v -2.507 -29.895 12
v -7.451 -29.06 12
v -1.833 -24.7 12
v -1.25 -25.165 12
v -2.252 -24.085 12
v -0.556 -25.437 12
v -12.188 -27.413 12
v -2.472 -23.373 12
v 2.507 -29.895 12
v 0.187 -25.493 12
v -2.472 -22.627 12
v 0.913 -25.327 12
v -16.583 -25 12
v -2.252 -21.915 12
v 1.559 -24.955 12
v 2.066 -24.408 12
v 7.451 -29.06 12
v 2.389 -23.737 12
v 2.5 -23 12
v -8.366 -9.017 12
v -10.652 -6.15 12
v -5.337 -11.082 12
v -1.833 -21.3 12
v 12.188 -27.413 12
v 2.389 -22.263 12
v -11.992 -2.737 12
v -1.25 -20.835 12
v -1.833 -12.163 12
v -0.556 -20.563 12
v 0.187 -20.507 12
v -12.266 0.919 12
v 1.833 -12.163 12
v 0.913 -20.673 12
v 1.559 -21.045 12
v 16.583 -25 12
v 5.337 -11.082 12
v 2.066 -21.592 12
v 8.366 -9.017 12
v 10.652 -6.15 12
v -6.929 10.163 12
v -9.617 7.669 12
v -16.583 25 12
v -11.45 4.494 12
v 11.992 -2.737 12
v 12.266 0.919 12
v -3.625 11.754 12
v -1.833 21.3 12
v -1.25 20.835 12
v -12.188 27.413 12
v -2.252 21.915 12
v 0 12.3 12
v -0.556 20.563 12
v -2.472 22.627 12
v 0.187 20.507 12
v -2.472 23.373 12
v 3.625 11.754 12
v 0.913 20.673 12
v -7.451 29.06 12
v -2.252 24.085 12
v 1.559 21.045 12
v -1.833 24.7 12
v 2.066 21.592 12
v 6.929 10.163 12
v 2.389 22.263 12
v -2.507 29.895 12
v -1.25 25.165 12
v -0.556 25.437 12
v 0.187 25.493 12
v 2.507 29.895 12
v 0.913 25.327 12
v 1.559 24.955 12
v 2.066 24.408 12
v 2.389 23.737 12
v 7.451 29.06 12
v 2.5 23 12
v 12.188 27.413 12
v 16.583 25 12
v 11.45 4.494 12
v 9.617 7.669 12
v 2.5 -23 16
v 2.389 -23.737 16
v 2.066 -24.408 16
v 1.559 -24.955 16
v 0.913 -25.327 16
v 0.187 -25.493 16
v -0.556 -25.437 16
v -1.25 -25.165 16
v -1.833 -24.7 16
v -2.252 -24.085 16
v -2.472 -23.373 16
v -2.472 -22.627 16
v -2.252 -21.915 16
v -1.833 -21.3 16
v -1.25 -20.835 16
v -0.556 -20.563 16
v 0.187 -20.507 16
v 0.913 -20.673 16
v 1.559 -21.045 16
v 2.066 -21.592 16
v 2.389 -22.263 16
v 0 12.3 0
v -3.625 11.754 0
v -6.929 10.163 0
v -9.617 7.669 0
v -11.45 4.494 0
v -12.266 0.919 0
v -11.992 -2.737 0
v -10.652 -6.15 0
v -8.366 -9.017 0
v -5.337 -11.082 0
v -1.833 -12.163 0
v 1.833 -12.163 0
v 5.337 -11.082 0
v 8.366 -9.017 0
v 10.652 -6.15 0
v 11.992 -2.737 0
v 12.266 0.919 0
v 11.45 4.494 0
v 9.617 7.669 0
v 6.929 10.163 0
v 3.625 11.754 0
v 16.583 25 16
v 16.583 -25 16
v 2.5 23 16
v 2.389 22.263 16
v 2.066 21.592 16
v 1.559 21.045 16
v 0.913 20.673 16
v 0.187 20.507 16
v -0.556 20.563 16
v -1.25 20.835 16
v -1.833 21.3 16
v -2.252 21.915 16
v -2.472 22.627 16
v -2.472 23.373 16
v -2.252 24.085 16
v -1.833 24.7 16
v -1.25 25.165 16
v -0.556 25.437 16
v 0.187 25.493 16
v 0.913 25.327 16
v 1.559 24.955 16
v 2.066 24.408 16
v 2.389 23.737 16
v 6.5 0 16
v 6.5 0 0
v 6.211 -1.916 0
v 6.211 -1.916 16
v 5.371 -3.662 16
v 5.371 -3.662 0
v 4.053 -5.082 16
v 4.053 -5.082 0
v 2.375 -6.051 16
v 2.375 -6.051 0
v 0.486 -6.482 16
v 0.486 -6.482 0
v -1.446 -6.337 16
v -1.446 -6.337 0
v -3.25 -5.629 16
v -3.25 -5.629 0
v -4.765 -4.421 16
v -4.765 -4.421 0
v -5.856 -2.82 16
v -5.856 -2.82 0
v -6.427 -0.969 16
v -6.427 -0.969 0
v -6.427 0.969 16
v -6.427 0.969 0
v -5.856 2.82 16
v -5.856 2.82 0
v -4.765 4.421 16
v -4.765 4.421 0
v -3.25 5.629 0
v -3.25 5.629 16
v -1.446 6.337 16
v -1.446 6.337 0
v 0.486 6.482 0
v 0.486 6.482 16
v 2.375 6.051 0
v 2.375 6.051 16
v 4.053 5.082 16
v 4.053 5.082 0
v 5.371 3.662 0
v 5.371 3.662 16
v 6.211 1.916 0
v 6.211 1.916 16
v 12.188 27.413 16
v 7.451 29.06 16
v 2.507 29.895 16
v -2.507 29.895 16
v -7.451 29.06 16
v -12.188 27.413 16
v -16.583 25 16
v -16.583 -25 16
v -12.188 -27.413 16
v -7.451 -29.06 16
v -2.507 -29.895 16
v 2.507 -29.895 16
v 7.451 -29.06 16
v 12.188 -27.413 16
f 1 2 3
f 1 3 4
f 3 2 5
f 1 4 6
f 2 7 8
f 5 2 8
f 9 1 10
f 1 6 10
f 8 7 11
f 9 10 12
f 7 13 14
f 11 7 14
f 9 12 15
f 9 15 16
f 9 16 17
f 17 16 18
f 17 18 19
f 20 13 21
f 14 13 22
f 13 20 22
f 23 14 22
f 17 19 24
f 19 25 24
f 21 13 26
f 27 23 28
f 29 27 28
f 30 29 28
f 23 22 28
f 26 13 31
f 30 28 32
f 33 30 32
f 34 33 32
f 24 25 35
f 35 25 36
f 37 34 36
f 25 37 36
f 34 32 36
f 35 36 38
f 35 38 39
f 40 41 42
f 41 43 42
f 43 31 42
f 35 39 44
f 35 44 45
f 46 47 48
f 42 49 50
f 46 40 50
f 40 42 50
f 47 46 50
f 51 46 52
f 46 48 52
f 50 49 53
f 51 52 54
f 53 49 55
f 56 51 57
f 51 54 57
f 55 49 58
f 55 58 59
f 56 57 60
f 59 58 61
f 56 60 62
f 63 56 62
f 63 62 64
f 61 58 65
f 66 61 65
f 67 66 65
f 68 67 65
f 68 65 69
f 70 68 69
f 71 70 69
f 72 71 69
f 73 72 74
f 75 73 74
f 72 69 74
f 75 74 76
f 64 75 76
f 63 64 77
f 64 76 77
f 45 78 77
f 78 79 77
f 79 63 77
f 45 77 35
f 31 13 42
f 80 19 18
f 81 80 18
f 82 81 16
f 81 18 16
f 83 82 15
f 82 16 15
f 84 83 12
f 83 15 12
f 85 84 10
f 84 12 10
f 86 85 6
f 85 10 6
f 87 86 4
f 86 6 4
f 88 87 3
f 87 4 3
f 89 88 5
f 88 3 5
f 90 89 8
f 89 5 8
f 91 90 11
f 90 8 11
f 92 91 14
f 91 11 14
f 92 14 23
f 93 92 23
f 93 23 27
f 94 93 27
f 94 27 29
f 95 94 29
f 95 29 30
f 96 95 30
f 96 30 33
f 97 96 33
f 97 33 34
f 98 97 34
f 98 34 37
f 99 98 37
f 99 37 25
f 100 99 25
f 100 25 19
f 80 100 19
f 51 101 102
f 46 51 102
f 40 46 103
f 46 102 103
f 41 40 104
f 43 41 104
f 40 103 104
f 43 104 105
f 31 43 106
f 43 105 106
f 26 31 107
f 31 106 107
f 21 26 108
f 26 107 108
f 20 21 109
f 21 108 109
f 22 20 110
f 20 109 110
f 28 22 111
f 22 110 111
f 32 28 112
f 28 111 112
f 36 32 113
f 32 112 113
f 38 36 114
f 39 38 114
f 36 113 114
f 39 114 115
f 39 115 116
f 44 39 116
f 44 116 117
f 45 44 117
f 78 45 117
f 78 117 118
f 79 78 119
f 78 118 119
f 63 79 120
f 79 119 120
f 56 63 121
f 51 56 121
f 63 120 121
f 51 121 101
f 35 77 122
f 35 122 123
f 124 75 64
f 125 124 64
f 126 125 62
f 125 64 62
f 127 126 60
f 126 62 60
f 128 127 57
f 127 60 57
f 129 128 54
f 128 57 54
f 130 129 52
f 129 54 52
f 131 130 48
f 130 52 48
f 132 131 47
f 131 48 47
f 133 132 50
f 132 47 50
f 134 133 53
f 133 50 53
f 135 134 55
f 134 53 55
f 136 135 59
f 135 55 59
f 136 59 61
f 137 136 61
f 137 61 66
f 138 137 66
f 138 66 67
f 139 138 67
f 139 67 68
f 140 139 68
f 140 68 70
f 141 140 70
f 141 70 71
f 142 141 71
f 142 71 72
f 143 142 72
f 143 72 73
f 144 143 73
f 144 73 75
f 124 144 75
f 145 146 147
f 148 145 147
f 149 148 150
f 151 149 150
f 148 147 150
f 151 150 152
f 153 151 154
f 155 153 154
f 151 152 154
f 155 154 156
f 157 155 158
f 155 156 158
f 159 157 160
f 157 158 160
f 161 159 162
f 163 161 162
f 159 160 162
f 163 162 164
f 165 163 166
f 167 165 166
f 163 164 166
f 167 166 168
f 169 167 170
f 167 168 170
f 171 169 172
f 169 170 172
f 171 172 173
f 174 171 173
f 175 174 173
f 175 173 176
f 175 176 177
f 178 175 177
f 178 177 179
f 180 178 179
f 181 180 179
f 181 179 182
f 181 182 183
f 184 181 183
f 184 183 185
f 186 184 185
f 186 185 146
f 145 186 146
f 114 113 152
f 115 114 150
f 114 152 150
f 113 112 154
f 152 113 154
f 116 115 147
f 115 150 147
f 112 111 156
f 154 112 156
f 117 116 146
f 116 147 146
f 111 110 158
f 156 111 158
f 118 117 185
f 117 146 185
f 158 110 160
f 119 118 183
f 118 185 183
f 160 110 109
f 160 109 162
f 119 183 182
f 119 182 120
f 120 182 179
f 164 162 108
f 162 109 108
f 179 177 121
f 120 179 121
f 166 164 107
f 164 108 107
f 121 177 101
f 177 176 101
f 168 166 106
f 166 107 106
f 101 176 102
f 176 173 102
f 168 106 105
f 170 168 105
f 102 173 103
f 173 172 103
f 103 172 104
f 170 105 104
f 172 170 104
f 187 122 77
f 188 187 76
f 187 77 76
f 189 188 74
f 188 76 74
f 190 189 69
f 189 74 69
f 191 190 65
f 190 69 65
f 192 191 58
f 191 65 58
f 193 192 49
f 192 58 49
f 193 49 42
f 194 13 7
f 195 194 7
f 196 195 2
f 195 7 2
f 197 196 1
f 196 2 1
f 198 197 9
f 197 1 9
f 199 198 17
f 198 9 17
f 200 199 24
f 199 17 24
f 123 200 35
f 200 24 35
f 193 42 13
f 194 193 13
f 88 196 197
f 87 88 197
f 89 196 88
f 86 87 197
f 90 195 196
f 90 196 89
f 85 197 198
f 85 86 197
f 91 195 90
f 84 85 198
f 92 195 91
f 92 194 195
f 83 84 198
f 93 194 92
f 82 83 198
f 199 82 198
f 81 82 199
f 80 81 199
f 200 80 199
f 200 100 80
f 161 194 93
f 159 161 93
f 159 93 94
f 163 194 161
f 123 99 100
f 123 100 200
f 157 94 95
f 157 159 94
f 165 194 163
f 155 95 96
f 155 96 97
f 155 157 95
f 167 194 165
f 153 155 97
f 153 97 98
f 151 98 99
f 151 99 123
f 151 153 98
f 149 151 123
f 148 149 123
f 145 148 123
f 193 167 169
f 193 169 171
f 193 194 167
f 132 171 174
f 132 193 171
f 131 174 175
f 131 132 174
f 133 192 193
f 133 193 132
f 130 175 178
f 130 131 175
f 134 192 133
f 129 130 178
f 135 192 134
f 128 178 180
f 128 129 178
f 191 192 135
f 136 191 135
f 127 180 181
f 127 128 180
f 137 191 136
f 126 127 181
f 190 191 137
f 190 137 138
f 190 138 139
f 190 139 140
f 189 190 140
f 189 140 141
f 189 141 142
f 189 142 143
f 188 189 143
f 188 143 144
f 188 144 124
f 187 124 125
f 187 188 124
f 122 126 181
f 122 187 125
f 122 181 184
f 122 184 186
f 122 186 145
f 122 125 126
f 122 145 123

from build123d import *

# Parameters (mm, degrees)
SKETCH1_R           = 12.3
BOSS_EXTRUDE1_DEPTH = 12
SKETCH2_R           = 30
BOSS_EXTRUDE2_DEPTH = 4
SKETCH3_R           = 2.5
CUT_EXTRUDE1_DEPTH  = 5
SKETCH4_R           = 6.5
CUT_EXTRUDE2_DEPTH  = 17
CUT_EXTRUDE3_DEPTH  = 5


with BuildPart() as part:
    # Sketch1 → Boss-Extrude1 (new body)
    with BuildSketch(Plane(origin=(0, 0, 0), x_dir=(0, 1, 0), z_dir=(0, 0, 1))):
        Circle(SKETCH1_R)
    extrude(amount=BOSS_EXTRUDE1_DEPTH)

    # Sketch2 → Boss-Extrude2 (add)
    with BuildSketch(Plane.XY.offset(12)):
        Circle(SKETCH2_R)
    extrude(amount=BOSS_EXTRUDE2_DEPTH)

    # Sketch3 → Cut-Extrude1 (cut, through all)
    with BuildSketch(Plane(origin=(0, 0, 12), x_dir=(1, 0, 0), z_dir=(0, 0, -1))):
        with Locations((0, 23)):
            Circle(SKETCH3_R)
        with Locations((0, -23)):
            Circle(SKETCH3_R)
    extrude(amount=-CUT_EXTRUDE1_DEPTH, mode=Mode.SUBTRACT)

    # Sketch4 → Cut-Extrude2 (cut, through all)
    with BuildSketch(Plane(origin=(0, 0, 0), x_dir=(1, 0, 0), z_dir=(0, 0, -1))):
        Circle(SKETCH4_R)
    extrude(amount=-CUT_EXTRUDE2_DEPTH, mode=Mode.SUBTRACT)

    # Sketch5 → Cut-Extrude3 (cut, through all)
    with BuildSketch(Plane(origin=(0, 0, 12), x_dir=(1, 0, 0), z_dir=(0, 0, -1))):
        with BuildLine():
            Line((-16.583123952, -25), (-16.583123952, 25))
            ThreePointArc((-16.583123952, 25), (-30, 0), (-16.583123952, -25))
        make_face()
        with BuildLine():
            Line((16.583123952, -25), (16.583123952, 25))
            ThreePointArc((16.583123952, 25), (30, 0), (16.583123952, -25))
        make_face()
    extrude(amount=-CUT_EXTRUDE3_DEPTH, mode=Mode.SUBTRACT)


solid = part.part
